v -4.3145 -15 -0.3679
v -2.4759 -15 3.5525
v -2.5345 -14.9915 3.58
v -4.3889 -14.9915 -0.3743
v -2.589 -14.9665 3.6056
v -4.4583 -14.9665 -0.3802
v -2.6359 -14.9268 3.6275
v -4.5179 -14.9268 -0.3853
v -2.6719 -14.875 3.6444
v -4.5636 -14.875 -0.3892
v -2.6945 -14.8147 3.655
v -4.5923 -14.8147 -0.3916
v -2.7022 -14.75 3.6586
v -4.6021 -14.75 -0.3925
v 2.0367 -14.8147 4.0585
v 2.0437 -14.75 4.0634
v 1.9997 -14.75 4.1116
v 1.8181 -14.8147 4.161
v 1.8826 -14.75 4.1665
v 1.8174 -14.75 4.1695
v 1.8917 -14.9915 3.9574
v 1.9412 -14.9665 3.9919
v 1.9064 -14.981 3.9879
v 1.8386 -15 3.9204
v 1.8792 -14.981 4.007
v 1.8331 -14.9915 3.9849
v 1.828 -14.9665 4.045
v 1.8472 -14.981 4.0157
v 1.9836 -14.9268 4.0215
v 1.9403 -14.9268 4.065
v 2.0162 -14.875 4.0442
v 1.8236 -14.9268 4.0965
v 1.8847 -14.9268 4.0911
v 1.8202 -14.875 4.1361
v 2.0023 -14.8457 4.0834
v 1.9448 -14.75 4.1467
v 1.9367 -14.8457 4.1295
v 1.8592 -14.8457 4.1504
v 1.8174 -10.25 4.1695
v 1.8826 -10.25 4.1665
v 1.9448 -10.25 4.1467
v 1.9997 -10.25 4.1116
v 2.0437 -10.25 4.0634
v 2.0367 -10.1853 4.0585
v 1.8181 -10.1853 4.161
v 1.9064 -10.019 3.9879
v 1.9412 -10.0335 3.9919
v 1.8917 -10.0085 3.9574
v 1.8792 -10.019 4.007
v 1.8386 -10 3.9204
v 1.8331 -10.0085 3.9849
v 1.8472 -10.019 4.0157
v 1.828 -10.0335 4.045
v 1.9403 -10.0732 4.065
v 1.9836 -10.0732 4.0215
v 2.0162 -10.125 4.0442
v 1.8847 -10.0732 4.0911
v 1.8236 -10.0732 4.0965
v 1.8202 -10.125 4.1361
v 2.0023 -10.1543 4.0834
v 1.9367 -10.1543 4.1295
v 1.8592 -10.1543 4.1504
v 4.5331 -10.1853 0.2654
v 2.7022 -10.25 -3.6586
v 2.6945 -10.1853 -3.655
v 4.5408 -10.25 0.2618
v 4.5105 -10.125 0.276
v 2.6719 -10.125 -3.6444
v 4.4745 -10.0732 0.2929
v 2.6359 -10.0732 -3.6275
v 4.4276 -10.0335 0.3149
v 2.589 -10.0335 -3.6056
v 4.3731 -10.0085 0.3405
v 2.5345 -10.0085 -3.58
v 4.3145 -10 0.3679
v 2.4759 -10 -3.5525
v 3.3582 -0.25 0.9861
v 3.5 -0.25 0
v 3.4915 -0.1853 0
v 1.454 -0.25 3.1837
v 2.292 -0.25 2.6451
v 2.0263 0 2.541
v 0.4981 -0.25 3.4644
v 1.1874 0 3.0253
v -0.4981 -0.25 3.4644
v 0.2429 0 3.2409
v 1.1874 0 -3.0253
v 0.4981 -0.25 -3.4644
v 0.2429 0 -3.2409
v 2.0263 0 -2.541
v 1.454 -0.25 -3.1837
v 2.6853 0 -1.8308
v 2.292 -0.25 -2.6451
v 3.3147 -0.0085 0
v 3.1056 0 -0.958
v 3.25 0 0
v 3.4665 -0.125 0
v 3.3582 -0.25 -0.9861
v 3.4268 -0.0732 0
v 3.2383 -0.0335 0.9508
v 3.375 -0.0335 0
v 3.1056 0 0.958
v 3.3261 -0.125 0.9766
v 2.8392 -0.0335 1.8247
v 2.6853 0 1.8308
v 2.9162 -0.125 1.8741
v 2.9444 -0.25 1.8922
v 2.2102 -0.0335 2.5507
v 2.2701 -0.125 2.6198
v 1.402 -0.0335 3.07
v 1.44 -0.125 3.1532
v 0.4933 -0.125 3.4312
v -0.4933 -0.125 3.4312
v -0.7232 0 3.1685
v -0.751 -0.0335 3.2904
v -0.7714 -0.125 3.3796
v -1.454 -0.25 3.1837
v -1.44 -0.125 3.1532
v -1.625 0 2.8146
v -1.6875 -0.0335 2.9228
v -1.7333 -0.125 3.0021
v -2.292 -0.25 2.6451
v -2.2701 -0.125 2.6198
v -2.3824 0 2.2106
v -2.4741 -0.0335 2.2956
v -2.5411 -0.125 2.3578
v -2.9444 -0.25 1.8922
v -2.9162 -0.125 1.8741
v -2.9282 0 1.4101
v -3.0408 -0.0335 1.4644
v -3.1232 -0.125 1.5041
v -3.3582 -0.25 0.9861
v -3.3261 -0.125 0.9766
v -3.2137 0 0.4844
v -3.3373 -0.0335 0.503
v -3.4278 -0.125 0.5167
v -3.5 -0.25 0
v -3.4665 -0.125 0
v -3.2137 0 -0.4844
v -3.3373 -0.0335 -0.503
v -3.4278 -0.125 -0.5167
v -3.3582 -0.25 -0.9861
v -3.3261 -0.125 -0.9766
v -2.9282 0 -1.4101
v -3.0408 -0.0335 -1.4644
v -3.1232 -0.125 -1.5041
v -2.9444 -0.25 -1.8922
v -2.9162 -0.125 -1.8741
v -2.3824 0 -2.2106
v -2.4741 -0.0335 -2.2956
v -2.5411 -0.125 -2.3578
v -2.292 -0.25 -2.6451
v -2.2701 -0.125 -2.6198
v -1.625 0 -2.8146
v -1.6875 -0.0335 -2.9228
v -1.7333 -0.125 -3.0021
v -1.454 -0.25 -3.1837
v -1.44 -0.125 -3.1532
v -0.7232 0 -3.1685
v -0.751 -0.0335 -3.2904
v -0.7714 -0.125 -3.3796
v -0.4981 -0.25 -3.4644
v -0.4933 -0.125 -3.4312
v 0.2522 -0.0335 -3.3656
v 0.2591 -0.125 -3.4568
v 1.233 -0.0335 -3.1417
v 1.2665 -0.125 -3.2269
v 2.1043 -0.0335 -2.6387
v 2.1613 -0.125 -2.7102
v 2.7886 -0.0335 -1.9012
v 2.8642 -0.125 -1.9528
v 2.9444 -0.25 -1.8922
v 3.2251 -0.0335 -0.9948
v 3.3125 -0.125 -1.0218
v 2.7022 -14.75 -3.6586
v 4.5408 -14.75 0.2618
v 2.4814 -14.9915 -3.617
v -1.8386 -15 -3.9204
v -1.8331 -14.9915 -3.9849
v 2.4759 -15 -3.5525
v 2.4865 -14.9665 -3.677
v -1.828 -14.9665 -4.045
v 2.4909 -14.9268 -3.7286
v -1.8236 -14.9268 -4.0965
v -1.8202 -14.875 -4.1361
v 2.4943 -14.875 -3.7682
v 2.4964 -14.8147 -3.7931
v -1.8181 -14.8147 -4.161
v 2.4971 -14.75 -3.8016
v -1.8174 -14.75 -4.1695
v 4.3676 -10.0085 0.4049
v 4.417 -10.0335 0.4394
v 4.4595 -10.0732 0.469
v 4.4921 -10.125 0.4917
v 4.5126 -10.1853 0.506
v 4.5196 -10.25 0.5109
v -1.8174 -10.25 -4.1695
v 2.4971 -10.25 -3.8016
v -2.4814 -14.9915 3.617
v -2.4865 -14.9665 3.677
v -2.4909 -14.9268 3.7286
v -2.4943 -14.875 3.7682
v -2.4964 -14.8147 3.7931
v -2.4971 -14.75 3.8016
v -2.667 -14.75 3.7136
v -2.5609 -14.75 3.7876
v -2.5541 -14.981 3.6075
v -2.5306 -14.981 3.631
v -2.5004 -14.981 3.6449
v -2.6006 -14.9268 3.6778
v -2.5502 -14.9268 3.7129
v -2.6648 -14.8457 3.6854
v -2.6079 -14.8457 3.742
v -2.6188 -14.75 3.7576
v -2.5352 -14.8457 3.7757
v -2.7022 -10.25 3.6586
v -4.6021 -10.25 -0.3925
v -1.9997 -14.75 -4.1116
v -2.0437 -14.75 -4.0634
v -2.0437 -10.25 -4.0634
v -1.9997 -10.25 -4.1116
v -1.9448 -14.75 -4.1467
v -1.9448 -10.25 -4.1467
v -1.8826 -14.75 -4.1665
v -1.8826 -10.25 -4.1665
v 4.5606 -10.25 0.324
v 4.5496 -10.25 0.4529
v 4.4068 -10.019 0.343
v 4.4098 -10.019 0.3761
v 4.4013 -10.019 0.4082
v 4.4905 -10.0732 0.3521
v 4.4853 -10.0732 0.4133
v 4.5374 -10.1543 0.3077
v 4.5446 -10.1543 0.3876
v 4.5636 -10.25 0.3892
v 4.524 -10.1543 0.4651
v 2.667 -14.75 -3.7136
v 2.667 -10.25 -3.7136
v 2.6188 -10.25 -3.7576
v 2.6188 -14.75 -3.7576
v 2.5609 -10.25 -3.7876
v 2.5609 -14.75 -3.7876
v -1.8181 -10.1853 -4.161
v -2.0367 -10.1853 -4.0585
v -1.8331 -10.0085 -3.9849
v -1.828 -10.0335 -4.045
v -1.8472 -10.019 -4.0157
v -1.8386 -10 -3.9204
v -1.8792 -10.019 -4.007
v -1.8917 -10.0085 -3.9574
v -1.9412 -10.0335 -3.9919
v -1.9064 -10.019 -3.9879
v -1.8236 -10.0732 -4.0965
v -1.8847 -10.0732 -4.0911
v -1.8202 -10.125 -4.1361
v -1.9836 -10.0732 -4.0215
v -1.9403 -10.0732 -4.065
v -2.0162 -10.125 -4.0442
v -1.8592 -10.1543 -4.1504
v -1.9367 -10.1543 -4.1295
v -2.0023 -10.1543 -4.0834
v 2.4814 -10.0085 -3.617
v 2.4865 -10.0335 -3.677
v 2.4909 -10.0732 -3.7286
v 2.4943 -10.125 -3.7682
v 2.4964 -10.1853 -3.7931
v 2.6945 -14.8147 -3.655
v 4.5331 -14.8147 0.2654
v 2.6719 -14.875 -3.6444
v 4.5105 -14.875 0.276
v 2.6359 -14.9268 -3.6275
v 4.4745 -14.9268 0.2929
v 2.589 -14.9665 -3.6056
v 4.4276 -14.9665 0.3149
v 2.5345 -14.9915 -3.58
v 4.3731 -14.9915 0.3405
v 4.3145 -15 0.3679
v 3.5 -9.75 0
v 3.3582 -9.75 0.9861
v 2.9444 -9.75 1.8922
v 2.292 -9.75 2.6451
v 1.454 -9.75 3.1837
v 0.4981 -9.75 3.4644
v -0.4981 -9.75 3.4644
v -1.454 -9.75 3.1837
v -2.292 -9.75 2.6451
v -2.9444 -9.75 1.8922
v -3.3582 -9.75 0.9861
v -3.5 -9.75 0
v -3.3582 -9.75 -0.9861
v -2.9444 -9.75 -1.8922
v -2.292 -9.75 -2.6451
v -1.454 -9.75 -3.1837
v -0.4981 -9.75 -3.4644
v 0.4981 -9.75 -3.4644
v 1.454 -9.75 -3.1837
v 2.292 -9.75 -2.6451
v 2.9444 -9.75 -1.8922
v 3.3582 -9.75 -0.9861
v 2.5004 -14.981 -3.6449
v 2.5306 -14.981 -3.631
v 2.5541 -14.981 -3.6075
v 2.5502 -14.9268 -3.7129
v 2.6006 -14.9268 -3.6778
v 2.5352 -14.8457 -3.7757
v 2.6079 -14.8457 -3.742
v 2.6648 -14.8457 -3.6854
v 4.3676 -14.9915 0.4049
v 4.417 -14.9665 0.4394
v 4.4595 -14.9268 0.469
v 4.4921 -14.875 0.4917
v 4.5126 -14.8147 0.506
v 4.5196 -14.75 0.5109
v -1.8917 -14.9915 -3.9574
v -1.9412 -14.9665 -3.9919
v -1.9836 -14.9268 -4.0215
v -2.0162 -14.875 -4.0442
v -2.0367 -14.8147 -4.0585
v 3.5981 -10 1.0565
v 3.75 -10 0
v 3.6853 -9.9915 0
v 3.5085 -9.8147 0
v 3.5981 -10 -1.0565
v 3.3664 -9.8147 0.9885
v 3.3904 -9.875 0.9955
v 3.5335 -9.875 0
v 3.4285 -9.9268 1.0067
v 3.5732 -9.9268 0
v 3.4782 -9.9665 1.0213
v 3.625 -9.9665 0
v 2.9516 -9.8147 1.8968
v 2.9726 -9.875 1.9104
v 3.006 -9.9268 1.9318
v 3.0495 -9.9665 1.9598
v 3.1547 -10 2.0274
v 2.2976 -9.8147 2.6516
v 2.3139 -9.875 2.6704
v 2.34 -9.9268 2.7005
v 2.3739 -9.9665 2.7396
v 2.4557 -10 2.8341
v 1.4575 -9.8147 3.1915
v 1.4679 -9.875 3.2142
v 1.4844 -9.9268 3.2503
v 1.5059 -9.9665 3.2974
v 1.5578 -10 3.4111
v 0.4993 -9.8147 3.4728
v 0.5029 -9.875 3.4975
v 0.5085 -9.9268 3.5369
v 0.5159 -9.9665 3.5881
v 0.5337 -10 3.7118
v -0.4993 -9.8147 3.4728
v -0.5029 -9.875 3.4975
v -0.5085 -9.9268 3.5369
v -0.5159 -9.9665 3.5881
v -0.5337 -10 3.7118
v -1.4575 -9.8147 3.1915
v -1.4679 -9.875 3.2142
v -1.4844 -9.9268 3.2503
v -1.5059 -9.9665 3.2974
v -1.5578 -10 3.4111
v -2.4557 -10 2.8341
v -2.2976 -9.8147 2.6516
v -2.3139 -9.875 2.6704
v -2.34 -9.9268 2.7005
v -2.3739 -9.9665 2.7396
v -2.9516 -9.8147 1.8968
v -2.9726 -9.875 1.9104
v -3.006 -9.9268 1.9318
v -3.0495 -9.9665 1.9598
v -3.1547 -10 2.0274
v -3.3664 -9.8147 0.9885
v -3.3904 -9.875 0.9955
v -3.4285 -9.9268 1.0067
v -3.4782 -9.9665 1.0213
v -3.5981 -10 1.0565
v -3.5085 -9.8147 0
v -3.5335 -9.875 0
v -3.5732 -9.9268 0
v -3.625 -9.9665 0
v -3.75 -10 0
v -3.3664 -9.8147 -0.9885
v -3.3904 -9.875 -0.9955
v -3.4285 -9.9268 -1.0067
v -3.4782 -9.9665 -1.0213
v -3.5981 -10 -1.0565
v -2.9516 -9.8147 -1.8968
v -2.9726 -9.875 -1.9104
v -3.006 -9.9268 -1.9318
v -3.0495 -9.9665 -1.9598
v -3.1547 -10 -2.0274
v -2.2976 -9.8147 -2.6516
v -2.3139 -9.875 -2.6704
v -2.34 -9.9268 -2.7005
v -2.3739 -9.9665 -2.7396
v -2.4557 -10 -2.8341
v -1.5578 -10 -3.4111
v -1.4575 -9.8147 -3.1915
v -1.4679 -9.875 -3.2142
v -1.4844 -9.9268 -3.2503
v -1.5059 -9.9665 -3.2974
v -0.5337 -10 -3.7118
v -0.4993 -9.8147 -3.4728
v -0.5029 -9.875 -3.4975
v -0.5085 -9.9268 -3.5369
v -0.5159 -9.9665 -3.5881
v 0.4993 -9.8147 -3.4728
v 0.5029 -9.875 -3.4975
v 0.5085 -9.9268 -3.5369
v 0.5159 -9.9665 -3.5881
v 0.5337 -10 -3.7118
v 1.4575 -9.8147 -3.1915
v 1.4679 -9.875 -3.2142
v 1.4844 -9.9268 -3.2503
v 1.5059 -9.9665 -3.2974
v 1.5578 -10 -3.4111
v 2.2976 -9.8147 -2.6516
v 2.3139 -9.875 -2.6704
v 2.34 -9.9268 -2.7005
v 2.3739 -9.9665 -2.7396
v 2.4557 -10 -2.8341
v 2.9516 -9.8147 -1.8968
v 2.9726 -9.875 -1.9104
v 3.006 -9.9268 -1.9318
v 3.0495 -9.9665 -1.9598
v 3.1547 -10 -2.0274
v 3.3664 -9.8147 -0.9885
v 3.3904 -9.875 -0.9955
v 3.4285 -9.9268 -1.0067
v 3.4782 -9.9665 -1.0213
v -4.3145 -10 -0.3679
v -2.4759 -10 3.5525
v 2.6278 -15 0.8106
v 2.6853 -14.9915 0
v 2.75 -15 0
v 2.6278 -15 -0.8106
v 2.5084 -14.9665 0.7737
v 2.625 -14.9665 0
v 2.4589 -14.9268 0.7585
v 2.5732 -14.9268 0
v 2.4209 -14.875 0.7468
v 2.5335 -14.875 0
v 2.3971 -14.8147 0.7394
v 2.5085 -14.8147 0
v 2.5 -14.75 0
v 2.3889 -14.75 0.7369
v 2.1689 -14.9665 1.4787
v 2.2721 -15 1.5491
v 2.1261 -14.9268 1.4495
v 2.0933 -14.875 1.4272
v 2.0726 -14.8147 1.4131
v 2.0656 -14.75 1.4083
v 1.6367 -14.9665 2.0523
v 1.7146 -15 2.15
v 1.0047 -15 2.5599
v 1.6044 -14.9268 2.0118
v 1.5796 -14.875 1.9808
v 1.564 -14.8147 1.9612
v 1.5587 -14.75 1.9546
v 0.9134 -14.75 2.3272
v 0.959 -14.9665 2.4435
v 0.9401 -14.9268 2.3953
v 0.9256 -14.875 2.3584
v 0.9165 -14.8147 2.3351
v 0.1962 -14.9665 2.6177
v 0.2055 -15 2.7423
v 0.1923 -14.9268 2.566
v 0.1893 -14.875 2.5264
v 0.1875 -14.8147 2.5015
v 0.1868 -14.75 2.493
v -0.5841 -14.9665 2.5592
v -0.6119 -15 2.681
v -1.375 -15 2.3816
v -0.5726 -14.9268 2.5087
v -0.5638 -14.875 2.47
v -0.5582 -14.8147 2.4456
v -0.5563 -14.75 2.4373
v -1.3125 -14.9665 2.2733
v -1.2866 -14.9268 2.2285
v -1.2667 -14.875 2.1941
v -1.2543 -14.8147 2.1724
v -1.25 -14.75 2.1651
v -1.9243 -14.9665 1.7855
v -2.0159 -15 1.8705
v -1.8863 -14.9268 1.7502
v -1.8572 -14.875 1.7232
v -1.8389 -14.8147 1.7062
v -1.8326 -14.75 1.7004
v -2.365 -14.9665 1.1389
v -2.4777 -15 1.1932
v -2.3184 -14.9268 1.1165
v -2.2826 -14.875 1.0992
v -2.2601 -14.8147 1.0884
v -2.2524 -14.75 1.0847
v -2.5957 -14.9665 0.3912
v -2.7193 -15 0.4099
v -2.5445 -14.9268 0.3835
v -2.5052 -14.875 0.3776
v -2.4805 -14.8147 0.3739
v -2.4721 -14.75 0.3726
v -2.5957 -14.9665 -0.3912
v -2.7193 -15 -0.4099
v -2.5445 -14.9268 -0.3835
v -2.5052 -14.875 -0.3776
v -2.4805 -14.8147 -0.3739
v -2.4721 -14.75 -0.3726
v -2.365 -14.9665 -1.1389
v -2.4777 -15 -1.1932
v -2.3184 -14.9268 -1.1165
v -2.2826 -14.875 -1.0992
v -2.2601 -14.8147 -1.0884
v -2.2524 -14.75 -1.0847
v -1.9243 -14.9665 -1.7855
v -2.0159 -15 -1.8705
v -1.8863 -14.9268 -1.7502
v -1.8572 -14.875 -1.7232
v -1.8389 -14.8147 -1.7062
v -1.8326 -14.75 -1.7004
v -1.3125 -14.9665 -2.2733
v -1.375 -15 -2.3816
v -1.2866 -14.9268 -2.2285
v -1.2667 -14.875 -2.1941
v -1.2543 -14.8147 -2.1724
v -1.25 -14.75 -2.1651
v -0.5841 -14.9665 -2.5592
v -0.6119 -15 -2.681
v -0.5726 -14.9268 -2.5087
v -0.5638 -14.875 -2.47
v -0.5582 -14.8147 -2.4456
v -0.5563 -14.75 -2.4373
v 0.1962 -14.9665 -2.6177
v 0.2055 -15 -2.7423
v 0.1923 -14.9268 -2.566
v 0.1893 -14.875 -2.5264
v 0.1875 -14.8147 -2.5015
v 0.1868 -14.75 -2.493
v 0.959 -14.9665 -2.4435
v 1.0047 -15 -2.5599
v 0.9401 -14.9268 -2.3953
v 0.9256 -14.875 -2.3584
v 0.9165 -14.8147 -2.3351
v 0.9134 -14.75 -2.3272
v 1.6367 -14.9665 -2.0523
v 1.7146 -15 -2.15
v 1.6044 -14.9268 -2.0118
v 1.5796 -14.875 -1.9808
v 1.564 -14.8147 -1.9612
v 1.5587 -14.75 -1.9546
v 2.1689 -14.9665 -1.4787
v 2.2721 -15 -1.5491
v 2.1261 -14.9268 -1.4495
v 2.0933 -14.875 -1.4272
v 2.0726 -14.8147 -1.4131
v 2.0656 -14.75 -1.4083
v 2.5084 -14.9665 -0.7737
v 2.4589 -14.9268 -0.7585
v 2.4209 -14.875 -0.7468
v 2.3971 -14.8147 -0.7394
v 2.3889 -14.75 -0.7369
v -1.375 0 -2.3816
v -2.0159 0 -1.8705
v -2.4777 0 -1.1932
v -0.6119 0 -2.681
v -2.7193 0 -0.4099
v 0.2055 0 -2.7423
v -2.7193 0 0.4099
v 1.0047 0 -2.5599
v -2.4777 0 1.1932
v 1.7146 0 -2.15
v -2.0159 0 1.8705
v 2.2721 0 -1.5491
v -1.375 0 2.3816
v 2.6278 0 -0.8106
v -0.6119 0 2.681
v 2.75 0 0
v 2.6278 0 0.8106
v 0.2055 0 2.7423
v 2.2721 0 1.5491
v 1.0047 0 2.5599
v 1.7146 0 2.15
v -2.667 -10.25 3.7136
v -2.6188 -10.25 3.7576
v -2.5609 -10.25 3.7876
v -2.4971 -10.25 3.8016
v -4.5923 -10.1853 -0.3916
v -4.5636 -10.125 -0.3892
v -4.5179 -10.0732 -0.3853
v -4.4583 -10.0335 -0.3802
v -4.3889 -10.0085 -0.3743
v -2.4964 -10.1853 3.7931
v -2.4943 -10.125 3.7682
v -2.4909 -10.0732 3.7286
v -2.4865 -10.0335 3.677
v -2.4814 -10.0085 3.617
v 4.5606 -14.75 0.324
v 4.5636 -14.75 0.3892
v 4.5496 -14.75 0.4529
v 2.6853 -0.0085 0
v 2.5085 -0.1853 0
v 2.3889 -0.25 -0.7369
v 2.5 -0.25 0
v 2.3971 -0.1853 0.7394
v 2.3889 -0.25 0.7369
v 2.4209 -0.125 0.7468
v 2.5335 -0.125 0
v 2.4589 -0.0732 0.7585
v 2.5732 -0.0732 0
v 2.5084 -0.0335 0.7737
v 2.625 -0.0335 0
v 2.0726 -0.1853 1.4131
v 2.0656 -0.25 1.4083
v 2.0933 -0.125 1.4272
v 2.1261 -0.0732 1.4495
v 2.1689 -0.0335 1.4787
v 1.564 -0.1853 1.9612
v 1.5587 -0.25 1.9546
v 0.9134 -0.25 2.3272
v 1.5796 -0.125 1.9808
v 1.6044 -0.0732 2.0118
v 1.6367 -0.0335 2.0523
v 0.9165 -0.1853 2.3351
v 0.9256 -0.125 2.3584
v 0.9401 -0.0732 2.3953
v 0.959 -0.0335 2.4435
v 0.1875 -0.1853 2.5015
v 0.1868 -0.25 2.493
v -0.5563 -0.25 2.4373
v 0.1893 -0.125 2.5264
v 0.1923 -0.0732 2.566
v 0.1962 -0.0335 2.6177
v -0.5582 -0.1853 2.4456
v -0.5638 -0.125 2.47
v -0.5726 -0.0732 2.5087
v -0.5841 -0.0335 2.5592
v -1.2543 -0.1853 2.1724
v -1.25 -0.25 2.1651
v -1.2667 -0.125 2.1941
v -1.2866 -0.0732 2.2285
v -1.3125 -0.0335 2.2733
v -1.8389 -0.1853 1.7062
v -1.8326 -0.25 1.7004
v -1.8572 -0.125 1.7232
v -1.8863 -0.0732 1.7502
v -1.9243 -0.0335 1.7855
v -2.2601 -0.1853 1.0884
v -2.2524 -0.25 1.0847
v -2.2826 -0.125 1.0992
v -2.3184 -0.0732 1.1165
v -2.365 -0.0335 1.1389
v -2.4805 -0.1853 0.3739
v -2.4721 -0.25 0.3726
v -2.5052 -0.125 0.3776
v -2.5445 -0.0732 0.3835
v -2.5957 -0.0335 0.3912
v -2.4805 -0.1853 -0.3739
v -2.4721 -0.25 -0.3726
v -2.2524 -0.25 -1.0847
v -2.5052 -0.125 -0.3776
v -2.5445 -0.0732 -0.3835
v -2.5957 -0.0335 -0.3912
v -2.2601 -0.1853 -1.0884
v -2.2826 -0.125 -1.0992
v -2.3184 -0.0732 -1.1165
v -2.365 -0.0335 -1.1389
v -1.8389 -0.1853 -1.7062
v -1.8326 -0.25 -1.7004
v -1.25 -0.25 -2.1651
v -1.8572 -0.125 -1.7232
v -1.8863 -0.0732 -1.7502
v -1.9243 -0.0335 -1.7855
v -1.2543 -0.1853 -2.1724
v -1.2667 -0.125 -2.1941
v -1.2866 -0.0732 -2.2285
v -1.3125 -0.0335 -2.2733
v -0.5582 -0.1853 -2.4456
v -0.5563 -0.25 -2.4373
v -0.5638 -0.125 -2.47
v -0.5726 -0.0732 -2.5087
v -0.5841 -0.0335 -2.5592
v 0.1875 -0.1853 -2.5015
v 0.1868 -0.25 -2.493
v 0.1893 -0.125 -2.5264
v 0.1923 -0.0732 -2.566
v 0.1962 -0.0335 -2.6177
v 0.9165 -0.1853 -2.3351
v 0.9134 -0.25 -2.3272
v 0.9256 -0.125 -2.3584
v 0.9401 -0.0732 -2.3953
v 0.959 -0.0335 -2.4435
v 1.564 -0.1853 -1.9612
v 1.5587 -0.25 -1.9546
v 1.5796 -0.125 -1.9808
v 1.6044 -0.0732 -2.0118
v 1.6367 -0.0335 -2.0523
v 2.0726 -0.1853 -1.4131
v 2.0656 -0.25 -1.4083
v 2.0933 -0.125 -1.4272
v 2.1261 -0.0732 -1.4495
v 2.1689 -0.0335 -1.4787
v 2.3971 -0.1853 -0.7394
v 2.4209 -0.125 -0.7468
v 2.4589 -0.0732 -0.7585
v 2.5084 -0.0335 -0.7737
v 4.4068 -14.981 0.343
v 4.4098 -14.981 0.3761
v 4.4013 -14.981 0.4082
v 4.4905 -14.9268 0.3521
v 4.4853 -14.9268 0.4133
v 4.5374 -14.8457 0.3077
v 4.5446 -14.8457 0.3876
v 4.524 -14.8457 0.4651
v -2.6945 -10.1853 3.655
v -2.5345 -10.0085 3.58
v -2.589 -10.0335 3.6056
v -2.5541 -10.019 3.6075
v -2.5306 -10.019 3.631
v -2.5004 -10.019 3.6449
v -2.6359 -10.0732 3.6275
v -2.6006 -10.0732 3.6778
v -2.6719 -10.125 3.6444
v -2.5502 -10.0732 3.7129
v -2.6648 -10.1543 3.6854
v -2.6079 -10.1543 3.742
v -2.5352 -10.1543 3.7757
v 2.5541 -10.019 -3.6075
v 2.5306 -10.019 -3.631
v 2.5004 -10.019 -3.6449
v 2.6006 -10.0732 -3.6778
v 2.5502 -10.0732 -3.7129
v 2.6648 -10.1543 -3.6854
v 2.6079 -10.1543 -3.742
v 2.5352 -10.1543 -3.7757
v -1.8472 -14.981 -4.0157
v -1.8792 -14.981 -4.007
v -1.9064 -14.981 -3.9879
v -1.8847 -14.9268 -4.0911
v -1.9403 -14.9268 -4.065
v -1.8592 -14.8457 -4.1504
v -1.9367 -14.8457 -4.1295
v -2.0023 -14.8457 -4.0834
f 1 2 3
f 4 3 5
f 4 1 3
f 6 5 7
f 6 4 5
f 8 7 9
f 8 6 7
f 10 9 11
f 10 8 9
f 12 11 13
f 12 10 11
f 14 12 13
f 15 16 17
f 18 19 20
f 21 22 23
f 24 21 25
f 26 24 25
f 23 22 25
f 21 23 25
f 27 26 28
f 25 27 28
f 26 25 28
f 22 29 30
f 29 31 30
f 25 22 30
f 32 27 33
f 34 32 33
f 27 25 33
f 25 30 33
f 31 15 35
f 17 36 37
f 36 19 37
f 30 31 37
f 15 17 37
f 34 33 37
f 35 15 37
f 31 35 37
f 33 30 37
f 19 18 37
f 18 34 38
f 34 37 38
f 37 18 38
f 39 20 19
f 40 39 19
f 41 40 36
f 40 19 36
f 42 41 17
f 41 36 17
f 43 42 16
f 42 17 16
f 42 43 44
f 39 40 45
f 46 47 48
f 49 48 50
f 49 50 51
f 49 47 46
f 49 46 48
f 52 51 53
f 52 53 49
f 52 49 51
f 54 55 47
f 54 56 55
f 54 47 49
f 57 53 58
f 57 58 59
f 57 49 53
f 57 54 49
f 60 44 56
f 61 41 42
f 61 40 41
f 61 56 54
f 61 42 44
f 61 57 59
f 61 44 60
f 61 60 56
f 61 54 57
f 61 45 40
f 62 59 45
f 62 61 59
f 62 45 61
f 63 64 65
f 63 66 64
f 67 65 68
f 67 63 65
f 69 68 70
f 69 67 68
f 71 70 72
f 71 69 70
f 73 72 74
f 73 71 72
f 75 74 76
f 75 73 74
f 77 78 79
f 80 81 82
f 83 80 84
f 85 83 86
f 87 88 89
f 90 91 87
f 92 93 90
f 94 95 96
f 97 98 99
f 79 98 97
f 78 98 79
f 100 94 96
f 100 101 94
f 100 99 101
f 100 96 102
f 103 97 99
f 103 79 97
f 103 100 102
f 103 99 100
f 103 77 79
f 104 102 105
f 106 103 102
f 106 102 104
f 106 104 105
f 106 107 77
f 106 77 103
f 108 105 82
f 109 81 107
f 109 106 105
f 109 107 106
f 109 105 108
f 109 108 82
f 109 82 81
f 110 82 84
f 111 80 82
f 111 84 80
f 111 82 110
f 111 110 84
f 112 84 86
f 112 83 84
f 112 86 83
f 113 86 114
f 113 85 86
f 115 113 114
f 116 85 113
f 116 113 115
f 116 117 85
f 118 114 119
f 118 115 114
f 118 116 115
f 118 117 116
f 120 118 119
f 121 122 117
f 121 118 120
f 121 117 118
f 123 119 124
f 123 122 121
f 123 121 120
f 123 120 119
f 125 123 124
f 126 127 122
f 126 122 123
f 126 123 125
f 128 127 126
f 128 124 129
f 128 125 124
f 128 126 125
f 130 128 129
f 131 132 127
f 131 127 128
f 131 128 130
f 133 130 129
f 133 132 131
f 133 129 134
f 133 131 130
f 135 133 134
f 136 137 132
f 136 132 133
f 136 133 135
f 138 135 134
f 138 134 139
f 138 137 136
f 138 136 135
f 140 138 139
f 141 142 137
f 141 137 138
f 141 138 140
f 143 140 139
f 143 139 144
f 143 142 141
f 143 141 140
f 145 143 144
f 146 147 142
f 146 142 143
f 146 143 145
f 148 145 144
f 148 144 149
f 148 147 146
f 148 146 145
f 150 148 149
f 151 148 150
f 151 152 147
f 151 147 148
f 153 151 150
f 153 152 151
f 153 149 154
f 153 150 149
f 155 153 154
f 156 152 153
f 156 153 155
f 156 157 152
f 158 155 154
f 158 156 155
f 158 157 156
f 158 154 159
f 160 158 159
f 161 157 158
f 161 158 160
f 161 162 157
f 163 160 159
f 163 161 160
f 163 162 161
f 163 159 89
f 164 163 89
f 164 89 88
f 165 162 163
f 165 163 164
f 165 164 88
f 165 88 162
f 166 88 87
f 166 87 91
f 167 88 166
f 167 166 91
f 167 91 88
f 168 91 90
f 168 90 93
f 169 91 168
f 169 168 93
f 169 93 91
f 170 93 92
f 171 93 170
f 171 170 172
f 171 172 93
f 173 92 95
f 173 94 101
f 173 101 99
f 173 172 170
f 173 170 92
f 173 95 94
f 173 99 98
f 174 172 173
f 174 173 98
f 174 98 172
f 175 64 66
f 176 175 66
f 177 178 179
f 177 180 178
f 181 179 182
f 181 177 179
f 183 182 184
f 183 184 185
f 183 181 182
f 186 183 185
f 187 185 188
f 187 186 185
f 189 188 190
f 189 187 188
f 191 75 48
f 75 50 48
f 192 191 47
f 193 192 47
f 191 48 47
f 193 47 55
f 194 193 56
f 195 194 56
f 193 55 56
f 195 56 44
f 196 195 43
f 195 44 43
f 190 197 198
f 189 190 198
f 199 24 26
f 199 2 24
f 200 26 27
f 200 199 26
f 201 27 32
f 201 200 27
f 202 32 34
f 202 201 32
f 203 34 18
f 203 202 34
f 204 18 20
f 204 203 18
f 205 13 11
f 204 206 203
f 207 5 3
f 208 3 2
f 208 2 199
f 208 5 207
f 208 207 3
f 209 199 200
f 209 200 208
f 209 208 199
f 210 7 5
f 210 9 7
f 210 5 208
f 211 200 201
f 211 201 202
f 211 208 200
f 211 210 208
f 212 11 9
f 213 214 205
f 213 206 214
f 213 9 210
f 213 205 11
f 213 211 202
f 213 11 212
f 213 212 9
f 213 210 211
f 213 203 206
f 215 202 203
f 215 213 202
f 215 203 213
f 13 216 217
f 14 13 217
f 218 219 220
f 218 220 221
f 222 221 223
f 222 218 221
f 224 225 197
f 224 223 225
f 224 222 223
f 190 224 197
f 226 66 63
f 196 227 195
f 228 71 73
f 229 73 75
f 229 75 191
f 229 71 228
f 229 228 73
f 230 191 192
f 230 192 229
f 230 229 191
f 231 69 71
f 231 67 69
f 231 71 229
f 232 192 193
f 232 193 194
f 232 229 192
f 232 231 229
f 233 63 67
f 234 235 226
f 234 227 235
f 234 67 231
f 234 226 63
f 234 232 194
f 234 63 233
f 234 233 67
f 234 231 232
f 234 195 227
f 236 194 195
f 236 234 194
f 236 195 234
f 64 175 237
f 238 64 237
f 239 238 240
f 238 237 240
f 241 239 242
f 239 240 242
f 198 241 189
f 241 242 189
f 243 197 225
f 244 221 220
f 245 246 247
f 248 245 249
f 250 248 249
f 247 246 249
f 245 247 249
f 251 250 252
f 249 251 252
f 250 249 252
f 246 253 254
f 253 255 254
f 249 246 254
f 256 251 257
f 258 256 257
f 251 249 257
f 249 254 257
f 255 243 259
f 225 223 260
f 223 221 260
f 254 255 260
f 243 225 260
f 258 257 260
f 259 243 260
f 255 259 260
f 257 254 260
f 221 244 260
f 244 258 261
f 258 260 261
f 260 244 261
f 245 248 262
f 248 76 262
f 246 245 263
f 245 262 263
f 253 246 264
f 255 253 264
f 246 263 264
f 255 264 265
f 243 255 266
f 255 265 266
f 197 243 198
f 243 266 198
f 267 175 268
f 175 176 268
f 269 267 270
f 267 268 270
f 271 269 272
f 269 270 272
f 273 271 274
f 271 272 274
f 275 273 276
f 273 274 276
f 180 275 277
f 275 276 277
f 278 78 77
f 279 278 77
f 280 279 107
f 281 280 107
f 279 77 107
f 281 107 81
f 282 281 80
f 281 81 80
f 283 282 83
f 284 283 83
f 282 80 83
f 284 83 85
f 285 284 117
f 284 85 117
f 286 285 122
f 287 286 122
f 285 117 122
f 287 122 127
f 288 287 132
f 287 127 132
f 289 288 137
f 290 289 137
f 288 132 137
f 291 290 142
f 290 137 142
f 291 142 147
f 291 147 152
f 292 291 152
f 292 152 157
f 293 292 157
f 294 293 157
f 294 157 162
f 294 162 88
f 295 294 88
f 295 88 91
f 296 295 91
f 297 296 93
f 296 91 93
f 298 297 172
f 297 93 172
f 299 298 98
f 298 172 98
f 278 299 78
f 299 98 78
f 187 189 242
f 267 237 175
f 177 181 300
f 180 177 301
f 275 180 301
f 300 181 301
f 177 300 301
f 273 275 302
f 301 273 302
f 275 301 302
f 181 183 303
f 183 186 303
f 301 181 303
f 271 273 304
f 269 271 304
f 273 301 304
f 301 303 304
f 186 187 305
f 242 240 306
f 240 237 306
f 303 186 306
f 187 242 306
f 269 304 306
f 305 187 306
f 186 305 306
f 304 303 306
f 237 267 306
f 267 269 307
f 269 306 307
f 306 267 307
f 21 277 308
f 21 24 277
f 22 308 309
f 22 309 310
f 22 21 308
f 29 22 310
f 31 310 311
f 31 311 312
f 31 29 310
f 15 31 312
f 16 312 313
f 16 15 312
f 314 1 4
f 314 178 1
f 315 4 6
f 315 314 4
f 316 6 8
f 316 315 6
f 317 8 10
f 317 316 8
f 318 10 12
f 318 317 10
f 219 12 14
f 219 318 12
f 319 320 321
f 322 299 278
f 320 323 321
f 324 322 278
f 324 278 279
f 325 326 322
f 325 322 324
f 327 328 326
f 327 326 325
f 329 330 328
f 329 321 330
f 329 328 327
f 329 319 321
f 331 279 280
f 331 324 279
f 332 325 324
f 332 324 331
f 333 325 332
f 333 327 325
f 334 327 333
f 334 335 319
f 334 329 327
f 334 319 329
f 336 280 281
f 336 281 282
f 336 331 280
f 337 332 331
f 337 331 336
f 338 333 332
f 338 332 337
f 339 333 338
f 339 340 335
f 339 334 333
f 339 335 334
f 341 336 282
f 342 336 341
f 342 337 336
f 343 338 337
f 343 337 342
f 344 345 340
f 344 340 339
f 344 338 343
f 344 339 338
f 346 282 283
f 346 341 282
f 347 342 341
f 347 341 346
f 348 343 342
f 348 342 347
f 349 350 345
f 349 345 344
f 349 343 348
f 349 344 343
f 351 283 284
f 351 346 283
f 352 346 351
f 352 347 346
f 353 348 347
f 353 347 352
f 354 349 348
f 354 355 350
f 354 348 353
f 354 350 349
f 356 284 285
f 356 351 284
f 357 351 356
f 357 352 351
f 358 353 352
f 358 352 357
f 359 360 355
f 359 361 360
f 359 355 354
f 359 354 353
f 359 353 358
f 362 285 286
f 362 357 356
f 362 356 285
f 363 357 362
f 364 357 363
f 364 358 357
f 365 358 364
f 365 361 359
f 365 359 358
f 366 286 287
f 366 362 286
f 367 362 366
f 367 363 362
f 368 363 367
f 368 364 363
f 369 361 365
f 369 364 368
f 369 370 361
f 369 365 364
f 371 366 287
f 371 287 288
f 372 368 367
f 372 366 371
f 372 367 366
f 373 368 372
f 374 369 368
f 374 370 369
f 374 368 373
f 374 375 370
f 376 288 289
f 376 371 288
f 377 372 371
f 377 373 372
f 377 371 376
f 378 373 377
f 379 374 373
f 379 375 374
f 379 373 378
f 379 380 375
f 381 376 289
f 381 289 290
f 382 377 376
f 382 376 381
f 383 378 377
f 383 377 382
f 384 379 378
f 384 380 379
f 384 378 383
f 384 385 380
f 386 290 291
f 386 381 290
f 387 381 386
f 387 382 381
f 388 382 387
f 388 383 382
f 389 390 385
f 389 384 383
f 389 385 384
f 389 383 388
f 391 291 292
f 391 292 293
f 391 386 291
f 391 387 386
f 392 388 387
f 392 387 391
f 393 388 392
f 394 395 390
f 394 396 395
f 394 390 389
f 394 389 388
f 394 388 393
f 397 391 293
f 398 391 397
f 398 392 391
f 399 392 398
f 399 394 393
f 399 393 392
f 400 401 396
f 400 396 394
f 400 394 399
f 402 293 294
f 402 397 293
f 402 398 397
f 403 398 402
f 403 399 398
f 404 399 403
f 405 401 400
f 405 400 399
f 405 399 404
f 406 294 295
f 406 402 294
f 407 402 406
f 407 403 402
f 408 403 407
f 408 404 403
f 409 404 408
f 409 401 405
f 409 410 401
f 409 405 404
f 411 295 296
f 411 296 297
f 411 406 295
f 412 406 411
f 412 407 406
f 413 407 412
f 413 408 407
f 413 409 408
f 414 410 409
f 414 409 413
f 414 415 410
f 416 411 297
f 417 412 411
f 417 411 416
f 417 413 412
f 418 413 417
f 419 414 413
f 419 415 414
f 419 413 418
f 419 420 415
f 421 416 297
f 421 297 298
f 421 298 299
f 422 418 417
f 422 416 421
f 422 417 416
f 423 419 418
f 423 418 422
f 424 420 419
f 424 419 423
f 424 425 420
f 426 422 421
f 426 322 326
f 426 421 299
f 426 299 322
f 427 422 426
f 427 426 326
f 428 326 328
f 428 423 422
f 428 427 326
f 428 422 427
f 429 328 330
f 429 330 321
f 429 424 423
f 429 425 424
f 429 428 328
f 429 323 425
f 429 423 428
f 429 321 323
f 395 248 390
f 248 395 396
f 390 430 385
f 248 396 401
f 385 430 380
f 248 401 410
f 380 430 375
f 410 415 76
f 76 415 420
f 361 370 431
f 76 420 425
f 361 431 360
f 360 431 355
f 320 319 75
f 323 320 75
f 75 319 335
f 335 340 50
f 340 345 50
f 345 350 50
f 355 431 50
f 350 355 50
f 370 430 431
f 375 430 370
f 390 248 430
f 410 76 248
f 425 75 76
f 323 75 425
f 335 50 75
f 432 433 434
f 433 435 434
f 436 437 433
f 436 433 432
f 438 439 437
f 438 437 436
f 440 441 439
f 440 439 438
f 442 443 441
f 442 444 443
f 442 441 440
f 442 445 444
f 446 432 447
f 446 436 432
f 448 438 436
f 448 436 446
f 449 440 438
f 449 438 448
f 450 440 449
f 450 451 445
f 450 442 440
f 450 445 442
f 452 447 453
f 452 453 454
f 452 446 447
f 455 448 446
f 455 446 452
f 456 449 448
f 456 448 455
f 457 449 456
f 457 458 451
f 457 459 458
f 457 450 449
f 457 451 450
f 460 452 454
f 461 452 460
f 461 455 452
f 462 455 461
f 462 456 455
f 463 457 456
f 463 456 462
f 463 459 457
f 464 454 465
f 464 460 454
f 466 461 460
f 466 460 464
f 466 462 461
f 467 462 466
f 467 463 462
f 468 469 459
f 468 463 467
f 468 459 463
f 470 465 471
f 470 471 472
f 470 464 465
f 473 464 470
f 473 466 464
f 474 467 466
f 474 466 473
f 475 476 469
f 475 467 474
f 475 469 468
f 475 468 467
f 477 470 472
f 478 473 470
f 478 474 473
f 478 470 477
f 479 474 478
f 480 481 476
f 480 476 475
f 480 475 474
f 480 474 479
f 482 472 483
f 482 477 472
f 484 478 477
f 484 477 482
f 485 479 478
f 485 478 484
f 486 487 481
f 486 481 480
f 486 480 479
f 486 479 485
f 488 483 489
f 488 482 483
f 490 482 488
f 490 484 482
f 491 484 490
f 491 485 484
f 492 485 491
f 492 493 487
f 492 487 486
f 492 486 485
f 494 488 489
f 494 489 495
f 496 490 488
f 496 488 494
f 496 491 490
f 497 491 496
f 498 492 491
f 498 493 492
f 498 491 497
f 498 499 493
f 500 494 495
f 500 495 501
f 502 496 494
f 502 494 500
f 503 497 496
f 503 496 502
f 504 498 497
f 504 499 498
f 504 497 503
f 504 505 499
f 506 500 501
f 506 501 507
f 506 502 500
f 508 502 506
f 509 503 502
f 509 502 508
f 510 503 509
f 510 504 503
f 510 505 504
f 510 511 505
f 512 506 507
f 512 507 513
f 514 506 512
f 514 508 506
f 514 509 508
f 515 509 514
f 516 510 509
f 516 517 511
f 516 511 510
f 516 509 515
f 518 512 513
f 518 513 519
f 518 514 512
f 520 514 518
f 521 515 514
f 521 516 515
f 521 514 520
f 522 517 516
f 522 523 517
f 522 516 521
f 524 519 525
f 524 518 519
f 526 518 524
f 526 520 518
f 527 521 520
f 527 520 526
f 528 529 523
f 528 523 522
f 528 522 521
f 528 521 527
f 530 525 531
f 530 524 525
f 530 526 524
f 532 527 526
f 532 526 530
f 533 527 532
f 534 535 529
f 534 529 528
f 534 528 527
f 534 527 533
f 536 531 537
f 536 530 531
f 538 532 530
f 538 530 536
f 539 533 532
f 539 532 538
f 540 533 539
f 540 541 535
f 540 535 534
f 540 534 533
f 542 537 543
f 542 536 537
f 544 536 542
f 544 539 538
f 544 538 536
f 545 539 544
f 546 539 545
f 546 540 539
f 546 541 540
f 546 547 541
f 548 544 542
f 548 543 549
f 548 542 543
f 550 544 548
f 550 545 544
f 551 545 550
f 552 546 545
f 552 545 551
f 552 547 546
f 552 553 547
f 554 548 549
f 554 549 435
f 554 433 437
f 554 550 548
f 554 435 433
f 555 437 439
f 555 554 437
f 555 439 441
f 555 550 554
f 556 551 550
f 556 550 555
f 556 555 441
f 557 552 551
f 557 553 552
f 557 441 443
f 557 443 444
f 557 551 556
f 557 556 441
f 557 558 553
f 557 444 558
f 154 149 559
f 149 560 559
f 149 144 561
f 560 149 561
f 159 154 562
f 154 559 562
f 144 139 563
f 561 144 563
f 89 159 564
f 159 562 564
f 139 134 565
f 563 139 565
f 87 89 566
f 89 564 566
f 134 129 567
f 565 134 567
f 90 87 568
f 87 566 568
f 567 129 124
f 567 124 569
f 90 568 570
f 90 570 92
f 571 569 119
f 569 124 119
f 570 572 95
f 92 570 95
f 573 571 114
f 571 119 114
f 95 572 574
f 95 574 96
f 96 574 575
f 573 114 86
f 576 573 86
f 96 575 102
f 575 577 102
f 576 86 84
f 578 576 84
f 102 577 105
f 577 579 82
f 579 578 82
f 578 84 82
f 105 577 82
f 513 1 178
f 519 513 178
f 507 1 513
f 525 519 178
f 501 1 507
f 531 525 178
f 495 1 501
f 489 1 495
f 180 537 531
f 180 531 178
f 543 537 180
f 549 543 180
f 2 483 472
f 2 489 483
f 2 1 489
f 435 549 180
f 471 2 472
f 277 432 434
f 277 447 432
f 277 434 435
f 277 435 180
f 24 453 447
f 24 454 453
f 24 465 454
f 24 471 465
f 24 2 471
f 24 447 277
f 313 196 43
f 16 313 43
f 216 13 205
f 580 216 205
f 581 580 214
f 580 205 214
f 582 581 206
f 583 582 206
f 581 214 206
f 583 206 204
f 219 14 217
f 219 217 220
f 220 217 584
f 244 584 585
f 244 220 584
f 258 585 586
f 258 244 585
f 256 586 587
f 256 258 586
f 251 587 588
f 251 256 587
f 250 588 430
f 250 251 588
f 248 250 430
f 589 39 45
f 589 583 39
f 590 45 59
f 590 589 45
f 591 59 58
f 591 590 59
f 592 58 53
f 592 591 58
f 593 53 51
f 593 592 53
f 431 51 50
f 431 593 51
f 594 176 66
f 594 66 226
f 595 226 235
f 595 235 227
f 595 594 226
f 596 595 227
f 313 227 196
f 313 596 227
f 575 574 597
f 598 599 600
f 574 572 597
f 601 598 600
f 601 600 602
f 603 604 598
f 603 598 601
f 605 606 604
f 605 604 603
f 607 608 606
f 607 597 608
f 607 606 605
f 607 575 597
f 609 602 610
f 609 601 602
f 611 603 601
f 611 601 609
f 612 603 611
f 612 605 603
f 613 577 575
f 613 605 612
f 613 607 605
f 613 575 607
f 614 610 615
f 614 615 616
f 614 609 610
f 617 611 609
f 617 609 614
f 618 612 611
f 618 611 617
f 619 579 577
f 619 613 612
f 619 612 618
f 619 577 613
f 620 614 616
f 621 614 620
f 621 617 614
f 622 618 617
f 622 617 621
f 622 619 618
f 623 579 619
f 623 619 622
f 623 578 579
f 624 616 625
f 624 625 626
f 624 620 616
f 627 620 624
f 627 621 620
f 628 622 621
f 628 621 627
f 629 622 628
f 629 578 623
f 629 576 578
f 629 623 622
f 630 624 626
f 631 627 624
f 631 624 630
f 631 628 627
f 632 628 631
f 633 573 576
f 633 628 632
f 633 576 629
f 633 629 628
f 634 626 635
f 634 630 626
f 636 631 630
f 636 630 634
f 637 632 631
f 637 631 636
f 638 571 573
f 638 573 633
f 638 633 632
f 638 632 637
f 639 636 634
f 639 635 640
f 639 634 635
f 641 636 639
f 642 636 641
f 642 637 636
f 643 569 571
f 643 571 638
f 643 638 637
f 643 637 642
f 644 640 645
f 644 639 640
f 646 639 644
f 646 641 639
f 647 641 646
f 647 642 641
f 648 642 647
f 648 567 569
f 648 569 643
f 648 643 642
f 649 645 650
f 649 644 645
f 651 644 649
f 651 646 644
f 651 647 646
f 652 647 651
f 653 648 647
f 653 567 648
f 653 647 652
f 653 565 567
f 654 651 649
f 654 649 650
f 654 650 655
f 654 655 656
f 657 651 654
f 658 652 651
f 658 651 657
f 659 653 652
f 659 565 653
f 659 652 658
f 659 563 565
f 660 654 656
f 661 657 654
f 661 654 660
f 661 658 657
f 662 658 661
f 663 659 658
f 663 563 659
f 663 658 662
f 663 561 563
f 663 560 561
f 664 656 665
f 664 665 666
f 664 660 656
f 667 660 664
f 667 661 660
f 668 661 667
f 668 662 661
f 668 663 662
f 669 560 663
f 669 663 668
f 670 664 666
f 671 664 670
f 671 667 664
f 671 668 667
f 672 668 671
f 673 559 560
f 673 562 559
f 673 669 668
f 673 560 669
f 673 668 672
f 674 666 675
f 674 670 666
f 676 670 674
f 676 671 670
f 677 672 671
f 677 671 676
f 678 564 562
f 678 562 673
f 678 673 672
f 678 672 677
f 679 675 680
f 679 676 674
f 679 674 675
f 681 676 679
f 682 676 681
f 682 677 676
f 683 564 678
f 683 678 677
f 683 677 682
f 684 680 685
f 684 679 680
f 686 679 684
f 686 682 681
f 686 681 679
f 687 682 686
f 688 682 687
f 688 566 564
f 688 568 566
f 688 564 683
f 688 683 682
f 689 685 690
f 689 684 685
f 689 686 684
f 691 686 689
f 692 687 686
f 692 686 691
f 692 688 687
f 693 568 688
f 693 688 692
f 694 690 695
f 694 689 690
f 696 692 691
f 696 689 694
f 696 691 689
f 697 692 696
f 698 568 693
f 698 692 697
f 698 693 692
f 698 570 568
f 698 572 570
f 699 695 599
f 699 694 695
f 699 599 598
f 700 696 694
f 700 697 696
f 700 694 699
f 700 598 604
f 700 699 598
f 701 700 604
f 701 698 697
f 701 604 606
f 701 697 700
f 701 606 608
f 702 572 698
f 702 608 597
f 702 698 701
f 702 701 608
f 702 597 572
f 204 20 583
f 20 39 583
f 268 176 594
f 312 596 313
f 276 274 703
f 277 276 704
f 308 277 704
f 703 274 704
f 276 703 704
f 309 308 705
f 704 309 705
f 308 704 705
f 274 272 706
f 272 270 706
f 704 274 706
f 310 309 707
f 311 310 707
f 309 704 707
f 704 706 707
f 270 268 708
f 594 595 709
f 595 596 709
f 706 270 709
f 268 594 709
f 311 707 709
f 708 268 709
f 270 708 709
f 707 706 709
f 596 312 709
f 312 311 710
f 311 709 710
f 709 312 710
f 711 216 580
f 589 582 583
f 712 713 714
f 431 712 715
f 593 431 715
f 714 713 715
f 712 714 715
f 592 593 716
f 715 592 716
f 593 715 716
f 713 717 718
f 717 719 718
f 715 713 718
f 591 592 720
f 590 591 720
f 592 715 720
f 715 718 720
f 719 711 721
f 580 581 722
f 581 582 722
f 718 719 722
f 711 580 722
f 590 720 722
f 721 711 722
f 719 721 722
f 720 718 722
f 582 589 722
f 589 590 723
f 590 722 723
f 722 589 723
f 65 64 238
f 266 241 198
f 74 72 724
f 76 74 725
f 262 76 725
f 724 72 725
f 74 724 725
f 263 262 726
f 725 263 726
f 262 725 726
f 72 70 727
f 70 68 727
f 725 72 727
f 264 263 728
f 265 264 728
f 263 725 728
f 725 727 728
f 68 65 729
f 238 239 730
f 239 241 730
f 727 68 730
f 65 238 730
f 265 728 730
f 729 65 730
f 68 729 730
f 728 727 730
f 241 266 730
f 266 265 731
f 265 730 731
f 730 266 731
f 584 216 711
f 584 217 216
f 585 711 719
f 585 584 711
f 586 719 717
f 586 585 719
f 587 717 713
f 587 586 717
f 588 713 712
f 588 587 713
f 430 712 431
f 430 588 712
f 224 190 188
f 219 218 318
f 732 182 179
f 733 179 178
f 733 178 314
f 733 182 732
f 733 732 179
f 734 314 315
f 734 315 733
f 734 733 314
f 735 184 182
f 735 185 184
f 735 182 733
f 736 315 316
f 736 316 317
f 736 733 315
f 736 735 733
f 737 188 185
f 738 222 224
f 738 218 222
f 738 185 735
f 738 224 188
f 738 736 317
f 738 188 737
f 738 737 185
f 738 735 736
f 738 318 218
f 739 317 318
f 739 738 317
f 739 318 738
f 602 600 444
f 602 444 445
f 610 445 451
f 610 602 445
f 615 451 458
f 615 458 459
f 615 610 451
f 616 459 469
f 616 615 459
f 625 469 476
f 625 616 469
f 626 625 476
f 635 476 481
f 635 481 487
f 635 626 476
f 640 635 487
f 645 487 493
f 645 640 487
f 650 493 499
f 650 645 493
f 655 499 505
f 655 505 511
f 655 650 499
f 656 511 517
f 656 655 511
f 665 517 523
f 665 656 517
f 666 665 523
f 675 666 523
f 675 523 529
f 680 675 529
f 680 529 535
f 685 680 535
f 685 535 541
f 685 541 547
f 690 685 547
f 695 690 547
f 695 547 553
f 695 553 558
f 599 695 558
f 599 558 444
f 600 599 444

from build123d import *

# Parameters (mm, degrees)
F0_R     = 3.5
F0_R_2   = 2.5
F1_DEPTH = 10
F2_START = 10
F2_DEPTH = 5
F3_R     = 0.24999


# Not quite as in the source:
# - a fillet or chamfer is up to 0.001 mm smaller than in the source, because OpenCascade refuses the exact size


with BuildPart() as f1:
    # F0 (on Front) → F1 (new body)
    with BuildSketch(Plane.XZ):
        Circle(F0_R)
        Circle(F0_R_2, mode=Mode.SUBTRACT)
    extrude(amount=F1_DEPTH)

    # F0 (on Front) → F2 (join)
    with BuildSketch(Plane.XZ.offset(F2_START)):
        Polygon((2.6409240726, -3.78930777), (4.6020988279, 0.3924534514), (1.9611747553, 4.1817612214), (-2.6409240726, 3.78930777), (-4.6020988279, -0.3924534514), (-1.9611747553, -4.1817612214), align=None)
        Circle(F0_R, mode=Mode.SUBTRACT)
        Circle(F0_R)
        Circle(F0_R_2, mode=Mode.SUBTRACT)
    extrude(amount=F2_DEPTH)

    # F3 (radius 0.25 in the source; OpenCascade refuses exactly that, so slightly less here)
    f3_edges = [f1.edges().sort_by_distance(p)[0] for p in [
        (-2.5, -15, 0),
        (-0.339875, -15, 3.985534),
        (-0.339875, -10, 3.985534),
        (1.961175, -12.5, 4.181761),
        (-3.5, 0, 0),
        (-2.640924, -12.5, 3.789308),
        (-3.621511, -15, 1.698427),
        (-3.281637, -15, -2.287107),
        (-3.621511, -10, 1.698427),
        (-3.281637, -10, -2.287107),
        (-1.961175, -12.5, -4.181761),
        (0.339875, -10, -3.985534),
        (2.640924, -12.5, -3.789308),
        (0.339875, -15, -3.985534),
        (3.621511, -15, -1.698427),
        (3.281637, -15, 2.287107),
        (4.602099, -12.5, 0.392453),
        (3.621511, -10, -1.698427),
        (3.281637, -10, 2.287107),
        (-3.5, -10, 0),
        (-2.5, 0, 0),
    ]]
    fillet(f3_edges, radius=F3_R)


solid = f1.part
